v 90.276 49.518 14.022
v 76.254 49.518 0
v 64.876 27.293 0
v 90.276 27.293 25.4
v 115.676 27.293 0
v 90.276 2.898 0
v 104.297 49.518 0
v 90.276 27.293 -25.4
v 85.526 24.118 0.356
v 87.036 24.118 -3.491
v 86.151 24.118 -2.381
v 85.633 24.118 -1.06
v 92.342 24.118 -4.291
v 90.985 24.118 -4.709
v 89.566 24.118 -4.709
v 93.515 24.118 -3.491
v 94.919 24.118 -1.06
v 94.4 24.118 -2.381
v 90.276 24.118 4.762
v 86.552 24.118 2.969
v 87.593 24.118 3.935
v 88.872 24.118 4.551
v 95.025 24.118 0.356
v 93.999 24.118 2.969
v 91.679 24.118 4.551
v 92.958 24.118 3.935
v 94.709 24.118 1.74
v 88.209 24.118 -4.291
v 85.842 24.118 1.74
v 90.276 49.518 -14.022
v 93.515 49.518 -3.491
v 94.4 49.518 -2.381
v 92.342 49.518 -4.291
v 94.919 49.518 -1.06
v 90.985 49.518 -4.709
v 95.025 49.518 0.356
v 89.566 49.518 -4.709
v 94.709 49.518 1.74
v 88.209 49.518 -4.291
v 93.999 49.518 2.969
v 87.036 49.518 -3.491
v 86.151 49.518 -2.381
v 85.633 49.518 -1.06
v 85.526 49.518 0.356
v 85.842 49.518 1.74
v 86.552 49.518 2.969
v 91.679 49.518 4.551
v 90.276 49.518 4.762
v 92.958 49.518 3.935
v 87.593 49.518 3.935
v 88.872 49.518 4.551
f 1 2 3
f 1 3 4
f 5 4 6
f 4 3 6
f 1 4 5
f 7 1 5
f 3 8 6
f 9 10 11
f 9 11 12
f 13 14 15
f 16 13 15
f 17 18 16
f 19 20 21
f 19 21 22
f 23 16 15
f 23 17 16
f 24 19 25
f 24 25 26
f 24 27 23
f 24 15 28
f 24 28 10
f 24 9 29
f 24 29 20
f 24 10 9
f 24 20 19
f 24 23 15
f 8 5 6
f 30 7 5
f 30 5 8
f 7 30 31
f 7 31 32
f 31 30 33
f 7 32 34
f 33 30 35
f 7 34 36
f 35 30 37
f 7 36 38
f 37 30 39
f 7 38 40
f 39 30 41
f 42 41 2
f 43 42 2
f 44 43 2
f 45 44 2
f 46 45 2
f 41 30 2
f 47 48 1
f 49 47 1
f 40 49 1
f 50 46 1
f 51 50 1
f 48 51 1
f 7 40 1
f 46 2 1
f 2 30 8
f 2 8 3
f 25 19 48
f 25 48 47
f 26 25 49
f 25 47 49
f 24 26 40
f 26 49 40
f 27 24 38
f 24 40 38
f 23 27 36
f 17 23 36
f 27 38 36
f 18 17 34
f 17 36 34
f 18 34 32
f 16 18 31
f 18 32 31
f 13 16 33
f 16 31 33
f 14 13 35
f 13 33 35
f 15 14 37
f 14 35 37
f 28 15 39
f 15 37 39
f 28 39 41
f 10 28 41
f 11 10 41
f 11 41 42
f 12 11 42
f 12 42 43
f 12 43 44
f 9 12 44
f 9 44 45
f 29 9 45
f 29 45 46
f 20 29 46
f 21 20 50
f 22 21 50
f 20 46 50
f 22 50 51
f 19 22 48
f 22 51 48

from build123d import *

# Parameters (mm, degrees)
BOSS_EXTRUDE1_DEPTH = 25.4
SKETCH2_W           = 48.842738796
SKETCH2_H           = 57.963308492
CUT_EXTRUDE1_DEPTH  = 25.4
CIRPATTERN1_COUNT   = 4
BOSS_EXTRUDE2_DEPTH = 25.4
SKETCH4_W           = 55.511744094
SKETCH4_H           = 37.462262811
CUT_EXTRUDE2_DEPTH  = 25.4
CIRPATTERN2_COUNT   = 4
SKETCH5_R           = 4.7625
CUT_EXTRUDE3_DEPTH  = 25.4


with BuildPart() as part:
    # Sketch1 → Boss-Extrude1 (new body)
    with BuildSketch(Plane.XY):
        Polygon((64.875616583, 27.293462823), (90.275616583, 27.293462823), (90.275616583, 49.518462823), (76.253828643, 49.518462823), align=None)
    boss_extrude1 = extrude(amount=BOSS_EXTRUDE1_DEPTH)

    # Sketch2 → Cut-Extrude1 (cut)
    with BuildSketch(Plane(origin=(22.502369916, -11.520213127, -22.502369916), x_dir=(0.7469488589136901, 0.3029911037986301, 0.5918308822513607), z_dir=(-0.664881494830121, 0.3403897702119252, 0.6648814948301214))):
        with Locations((74.048071209, 28.981654246)):
            Rectangle(SKETCH2_W, SKETCH2_H)
    cut_extrude1 = extrude(amount=CUT_EXTRUDE1_DEPTH, mode=Mode.SUBTRACT)

    # CirPattern1: Boss-Extrude1, Cut-Extrude1 ×4 about axis
    cirpattern1_axis = Axis((90.275616583, 0, 0), (0, 1, 0))
    add([boss_extrude1.rotate(cirpattern1_axis, i * 360 / CIRPATTERN1_COUNT) for i in range(1, CIRPATTERN1_COUNT)])
    add([cut_extrude1.rotate(cirpattern1_axis, i * 360 / CIRPATTERN1_COUNT) for i in range(1, CIRPATTERN1_COUNT)], mode=Mode.SUBTRACT)

    # Sketch3 → Boss-Extrude2 (add)
    with BuildSketch(Plane.XY):
        Polygon((90.275616583, 27.293462823), (64.875616583, 27.293462823), (90.275616583, 2.897951184), align=None)
    boss_extrude2 = extrude(amount=BOSS_EXTRUDE2_DEPTH)

    # Sketch4 → Cut-Extrude2 (cut)
    with BuildSketch(Plane(origin=(30.250165476, 31.49571997, -30.250165476), x_dir=(0.822040500476201, -0.41068588128331385, 0.3944445746760687), z_dir=(0.5694290259346084, 0.5928753400558371, -0.56942902593461))):
        with Locations((65.735556872, -20.321660951)):
            Rectangle(SKETCH4_W, SKETCH4_H)
    cut_extrude2 = extrude(amount=-CUT_EXTRUDE2_DEPTH, mode=Mode.SUBTRACT)

    # CirPattern2: Boss-Extrude2, Cut-Extrude2 ×4 about axis
    cirpattern2_axis = Axis((90.275616583, 0, 0), (0, 1, 0))
    add([boss_extrude2.rotate(cirpattern2_axis, i * 360 / CIRPATTERN2_COUNT) for i in range(1, CIRPATTERN2_COUNT)])
    add([cut_extrude2.rotate(cirpattern2_axis, i * 360 / CIRPATTERN2_COUNT) for i in range(1, CIRPATTERN2_COUNT)], mode=Mode.SUBTRACT)

    # Sketch5 → Cut-Extrude3 (cut)
    with BuildSketch(Plane(origin=(0, 49.518462823, 0), x_dir=(1, 0, 0), z_dir=(0, 1, 0))):
        with Locations(Location((90.275616583, 0, 0), (0, 0, 270))):
            Circle(SKETCH5_R)
    extrude(amount=-CUT_EXTRUDE3_DEPTH, mode=Mode.SUBTRACT)


solid = part.part
